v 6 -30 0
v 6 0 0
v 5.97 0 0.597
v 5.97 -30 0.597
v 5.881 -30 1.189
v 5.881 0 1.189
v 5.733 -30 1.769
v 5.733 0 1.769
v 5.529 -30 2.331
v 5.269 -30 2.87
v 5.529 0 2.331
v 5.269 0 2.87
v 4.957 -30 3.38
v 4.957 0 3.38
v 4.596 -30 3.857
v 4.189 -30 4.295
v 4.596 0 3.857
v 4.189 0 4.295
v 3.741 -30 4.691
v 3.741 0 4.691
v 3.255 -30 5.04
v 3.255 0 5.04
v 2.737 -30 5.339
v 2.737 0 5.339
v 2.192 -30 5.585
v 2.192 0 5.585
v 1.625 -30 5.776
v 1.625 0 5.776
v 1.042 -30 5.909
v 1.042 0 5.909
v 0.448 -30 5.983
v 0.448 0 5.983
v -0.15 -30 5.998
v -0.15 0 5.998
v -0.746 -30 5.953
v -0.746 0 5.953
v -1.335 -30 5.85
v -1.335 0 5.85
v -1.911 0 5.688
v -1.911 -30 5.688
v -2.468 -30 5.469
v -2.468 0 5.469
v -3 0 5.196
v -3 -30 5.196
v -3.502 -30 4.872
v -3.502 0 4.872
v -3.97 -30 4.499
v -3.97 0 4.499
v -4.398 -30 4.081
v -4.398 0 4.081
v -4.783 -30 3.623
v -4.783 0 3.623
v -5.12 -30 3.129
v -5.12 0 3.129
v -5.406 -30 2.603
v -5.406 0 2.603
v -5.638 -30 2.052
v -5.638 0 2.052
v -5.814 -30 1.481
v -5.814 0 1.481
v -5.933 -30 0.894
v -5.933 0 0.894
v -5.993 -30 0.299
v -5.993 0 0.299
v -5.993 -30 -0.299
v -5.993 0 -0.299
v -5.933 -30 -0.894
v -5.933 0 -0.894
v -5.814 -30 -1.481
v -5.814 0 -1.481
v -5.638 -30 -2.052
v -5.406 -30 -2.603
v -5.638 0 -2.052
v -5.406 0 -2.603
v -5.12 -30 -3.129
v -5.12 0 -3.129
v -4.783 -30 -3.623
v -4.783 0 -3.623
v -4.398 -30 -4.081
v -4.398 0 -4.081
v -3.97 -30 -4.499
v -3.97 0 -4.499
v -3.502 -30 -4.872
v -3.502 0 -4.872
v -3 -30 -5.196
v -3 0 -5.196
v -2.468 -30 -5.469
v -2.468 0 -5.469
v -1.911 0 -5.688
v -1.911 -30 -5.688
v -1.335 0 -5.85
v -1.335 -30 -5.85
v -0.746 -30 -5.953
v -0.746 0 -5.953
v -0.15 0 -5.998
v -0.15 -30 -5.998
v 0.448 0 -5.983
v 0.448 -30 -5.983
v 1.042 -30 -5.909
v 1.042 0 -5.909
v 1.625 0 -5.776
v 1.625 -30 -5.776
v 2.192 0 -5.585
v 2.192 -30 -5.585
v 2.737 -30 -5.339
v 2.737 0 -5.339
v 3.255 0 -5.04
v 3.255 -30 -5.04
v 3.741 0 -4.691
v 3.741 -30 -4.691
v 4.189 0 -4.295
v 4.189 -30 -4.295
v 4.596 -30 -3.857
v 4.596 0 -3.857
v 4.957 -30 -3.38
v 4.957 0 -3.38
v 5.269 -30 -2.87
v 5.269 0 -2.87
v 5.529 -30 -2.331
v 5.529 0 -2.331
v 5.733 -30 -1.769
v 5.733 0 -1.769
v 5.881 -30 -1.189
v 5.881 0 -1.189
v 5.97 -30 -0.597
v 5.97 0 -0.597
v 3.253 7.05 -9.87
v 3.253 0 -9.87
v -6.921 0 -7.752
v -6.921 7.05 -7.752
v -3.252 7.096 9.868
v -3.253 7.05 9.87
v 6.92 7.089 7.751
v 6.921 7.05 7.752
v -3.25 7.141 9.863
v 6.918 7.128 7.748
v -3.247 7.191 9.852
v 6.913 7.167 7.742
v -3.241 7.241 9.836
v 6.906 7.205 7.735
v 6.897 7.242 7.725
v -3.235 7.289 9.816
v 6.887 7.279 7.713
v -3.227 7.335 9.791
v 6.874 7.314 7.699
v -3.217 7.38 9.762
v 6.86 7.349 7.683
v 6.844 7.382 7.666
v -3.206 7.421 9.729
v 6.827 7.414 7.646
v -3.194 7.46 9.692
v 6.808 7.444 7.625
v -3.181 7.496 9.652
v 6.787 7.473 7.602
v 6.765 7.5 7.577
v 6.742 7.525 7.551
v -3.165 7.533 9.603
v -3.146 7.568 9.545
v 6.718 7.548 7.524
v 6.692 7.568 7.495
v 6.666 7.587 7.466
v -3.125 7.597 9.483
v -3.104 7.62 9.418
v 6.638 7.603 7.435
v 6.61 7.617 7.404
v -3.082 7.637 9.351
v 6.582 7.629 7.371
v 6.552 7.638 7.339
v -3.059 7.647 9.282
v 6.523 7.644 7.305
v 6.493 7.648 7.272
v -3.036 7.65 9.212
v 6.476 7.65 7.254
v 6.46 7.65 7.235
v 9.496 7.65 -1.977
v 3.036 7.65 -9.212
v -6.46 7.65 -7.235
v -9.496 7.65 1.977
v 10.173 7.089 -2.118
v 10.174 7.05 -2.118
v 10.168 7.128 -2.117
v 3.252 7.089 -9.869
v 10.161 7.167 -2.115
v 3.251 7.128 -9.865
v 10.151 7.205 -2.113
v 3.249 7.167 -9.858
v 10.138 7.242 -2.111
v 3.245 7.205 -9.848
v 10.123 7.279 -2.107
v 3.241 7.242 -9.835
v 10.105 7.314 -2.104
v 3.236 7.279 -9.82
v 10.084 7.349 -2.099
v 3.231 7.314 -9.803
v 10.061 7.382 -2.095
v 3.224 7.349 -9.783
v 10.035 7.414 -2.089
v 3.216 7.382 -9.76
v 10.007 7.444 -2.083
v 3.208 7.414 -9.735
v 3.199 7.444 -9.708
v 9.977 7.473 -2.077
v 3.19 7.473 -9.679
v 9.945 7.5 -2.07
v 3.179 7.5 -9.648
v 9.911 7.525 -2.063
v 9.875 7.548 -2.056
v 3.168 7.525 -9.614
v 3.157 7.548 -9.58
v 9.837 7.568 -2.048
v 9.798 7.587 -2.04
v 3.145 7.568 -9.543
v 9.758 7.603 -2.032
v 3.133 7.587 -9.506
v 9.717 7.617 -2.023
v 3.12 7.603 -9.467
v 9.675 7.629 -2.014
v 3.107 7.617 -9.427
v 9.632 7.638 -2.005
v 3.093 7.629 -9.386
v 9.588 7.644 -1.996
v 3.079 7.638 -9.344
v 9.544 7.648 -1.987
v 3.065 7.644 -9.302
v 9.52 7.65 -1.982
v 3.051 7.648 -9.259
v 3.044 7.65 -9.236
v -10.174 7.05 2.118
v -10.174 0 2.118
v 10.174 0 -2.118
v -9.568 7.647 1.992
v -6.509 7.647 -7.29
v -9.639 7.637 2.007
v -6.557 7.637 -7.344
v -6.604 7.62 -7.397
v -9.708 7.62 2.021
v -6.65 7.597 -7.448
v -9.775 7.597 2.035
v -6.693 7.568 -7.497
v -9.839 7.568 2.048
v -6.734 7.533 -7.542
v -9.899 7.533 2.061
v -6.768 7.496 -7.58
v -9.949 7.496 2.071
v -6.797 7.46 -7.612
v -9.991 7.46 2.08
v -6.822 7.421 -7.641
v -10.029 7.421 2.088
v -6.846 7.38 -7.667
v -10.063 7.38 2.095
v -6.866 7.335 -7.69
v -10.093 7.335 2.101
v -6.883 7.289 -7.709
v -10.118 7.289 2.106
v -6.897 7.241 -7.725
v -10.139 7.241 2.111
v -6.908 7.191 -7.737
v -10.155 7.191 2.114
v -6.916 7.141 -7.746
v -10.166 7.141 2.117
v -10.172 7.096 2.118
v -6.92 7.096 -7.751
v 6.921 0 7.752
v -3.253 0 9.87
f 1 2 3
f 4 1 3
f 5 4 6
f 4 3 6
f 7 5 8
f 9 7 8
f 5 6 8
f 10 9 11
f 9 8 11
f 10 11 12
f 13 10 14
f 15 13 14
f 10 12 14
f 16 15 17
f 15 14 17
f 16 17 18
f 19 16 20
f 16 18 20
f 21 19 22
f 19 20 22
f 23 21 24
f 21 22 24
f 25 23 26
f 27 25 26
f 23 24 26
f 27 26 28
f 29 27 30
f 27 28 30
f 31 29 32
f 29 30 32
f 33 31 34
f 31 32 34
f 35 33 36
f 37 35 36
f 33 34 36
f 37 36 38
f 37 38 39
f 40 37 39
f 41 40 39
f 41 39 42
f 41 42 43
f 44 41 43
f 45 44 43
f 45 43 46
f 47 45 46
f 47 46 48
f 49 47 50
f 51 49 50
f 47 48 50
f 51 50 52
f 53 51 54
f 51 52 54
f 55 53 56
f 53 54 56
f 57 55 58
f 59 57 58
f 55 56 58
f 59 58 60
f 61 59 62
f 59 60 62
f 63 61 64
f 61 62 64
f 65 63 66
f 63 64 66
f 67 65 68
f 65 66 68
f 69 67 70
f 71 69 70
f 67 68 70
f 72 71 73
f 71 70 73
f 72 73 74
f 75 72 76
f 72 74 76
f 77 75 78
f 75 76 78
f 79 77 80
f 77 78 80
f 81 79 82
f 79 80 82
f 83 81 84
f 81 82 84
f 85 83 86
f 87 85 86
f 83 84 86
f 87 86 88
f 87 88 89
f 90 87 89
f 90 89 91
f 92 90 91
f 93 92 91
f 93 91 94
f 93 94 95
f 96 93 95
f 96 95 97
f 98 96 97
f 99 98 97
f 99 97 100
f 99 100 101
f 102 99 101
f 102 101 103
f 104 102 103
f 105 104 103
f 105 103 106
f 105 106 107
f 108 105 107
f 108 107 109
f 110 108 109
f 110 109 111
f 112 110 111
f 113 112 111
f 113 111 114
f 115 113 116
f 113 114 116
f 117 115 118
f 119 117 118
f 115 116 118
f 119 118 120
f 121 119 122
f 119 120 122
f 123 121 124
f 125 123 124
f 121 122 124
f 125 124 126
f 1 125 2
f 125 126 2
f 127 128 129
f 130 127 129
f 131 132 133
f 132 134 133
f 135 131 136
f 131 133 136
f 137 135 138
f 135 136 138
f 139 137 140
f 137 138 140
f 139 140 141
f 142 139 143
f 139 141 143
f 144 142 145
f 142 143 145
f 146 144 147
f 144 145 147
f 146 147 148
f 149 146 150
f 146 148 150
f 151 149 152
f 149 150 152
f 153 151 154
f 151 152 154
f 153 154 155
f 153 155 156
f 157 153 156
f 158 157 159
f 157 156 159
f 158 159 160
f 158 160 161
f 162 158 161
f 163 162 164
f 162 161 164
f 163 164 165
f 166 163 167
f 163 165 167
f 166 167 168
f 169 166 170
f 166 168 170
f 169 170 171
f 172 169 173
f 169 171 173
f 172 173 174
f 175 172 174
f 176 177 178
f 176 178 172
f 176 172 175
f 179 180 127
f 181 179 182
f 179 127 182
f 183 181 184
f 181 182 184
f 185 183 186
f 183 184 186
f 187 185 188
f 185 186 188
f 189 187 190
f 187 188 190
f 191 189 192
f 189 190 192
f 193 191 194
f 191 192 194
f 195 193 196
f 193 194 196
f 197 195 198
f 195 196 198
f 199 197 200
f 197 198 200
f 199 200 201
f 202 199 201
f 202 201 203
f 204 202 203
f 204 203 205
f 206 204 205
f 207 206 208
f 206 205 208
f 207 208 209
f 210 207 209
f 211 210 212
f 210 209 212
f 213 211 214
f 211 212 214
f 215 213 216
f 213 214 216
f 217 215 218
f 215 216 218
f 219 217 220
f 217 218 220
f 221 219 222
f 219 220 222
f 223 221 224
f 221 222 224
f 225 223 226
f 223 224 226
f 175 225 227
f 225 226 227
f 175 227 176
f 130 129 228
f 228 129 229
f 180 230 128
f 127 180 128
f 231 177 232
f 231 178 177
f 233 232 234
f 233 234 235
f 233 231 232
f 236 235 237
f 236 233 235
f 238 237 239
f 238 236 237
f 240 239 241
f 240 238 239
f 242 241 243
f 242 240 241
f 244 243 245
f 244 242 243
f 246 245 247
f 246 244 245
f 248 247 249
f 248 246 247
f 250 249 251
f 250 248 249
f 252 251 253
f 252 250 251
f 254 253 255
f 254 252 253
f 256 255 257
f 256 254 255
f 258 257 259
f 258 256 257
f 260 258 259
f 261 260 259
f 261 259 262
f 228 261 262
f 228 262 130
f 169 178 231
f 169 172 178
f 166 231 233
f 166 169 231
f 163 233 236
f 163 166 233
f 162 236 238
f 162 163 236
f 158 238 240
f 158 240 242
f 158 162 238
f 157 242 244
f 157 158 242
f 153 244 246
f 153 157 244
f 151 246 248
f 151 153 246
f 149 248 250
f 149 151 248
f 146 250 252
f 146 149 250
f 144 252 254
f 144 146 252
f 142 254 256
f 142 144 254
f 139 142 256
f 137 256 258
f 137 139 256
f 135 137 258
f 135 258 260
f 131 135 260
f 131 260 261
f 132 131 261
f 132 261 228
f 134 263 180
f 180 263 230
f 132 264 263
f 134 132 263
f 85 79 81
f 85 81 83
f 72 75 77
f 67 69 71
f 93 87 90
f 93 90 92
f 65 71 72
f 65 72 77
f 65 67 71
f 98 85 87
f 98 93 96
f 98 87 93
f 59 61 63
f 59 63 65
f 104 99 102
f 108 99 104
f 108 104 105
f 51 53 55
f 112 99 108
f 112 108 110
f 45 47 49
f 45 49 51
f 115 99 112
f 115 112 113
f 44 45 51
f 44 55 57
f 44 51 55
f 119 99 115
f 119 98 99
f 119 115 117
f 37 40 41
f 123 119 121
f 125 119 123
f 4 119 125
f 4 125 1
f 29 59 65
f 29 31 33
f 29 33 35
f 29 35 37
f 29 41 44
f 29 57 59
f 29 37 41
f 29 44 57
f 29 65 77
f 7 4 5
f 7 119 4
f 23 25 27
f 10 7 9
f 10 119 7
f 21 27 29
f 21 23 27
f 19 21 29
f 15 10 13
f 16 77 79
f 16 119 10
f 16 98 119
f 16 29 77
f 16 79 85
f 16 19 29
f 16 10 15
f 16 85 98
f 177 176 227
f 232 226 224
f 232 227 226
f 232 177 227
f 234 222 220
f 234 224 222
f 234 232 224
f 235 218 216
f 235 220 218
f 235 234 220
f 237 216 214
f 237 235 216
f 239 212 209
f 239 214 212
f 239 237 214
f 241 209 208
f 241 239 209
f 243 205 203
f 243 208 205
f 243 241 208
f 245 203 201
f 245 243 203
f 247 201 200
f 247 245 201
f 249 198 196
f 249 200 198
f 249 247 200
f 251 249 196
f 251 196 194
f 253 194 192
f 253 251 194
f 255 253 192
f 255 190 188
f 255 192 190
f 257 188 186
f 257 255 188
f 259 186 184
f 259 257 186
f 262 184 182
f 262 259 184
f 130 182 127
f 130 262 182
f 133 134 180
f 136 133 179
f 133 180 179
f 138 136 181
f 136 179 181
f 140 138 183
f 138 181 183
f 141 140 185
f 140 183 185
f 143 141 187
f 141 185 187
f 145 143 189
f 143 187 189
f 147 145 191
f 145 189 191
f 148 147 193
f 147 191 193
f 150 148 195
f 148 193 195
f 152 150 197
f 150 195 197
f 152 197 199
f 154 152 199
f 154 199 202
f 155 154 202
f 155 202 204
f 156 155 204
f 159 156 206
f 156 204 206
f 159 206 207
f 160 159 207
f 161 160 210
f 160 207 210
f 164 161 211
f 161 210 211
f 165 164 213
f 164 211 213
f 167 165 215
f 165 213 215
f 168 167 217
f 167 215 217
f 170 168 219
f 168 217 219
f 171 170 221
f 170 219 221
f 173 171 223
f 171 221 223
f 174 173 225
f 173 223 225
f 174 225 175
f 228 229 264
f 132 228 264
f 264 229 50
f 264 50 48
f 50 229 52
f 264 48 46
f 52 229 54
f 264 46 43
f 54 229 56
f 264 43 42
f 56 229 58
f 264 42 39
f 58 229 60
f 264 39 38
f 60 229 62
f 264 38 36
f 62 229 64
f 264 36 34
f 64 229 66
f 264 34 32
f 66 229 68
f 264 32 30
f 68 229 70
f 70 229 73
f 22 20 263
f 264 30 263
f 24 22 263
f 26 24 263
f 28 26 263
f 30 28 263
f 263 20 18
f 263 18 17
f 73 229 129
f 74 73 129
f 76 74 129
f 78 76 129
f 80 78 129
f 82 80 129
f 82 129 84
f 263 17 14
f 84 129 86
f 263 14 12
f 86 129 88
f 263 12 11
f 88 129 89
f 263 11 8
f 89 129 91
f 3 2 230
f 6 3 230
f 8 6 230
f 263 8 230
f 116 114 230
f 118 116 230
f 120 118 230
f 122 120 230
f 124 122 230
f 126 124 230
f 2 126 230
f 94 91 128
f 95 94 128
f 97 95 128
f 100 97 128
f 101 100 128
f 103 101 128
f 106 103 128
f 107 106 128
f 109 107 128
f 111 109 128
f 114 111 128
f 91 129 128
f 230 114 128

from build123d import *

# Parameters (mm, degrees)
EXTRUDE_1_DEPTH = 7.65
SKETCH_2_R      = 6
EXTRUDE_2_DEPTH = 30
FILLET_1_R      = 0.6


with BuildPart() as part:
    # 草图1 → 凸台-拉伸1 (new body)
    with BuildSketch(Plane(origin=(0, 0, 0), x_dir=(1, 0, 0), z_dir=(0, 1, 0))):
        Polygon((6.921438907, -7.752011575), (10.174158408, 2.118136136), (3.252719501, 9.870147711), (-6.921438907, 7.752011575), (-10.174158408, -2.118136136), (-3.252719501, -9.870147711), align=None)
    extrude(amount=EXTRUDE_1_DEPTH)

    # 草图2 → 凸台-拉伸2 (add)
    with BuildSketch(Plane.XZ):
        Circle(SKETCH_2_R)
    extrude(amount=EXTRUDE_2_DEPTH)

    # 圆角1
    fillet_1_edges = [part.edges().sort_by_distance(p)[0] for p in [
        (6.713438955, 7.65, -5.994141924),
        (-1.834359703, 7.65, -8.811079643),
        (-8.547798657, 7.65, -2.81693772),
        (-6.713438955, 7.65, 5.994141924),
        (1.834359703, 7.65, 8.811079643),
        (8.547798657, 7.65, 2.81693772),
    ]]
    fillet(fillet_1_edges, radius=FILLET_1_R)


solid = part.part
